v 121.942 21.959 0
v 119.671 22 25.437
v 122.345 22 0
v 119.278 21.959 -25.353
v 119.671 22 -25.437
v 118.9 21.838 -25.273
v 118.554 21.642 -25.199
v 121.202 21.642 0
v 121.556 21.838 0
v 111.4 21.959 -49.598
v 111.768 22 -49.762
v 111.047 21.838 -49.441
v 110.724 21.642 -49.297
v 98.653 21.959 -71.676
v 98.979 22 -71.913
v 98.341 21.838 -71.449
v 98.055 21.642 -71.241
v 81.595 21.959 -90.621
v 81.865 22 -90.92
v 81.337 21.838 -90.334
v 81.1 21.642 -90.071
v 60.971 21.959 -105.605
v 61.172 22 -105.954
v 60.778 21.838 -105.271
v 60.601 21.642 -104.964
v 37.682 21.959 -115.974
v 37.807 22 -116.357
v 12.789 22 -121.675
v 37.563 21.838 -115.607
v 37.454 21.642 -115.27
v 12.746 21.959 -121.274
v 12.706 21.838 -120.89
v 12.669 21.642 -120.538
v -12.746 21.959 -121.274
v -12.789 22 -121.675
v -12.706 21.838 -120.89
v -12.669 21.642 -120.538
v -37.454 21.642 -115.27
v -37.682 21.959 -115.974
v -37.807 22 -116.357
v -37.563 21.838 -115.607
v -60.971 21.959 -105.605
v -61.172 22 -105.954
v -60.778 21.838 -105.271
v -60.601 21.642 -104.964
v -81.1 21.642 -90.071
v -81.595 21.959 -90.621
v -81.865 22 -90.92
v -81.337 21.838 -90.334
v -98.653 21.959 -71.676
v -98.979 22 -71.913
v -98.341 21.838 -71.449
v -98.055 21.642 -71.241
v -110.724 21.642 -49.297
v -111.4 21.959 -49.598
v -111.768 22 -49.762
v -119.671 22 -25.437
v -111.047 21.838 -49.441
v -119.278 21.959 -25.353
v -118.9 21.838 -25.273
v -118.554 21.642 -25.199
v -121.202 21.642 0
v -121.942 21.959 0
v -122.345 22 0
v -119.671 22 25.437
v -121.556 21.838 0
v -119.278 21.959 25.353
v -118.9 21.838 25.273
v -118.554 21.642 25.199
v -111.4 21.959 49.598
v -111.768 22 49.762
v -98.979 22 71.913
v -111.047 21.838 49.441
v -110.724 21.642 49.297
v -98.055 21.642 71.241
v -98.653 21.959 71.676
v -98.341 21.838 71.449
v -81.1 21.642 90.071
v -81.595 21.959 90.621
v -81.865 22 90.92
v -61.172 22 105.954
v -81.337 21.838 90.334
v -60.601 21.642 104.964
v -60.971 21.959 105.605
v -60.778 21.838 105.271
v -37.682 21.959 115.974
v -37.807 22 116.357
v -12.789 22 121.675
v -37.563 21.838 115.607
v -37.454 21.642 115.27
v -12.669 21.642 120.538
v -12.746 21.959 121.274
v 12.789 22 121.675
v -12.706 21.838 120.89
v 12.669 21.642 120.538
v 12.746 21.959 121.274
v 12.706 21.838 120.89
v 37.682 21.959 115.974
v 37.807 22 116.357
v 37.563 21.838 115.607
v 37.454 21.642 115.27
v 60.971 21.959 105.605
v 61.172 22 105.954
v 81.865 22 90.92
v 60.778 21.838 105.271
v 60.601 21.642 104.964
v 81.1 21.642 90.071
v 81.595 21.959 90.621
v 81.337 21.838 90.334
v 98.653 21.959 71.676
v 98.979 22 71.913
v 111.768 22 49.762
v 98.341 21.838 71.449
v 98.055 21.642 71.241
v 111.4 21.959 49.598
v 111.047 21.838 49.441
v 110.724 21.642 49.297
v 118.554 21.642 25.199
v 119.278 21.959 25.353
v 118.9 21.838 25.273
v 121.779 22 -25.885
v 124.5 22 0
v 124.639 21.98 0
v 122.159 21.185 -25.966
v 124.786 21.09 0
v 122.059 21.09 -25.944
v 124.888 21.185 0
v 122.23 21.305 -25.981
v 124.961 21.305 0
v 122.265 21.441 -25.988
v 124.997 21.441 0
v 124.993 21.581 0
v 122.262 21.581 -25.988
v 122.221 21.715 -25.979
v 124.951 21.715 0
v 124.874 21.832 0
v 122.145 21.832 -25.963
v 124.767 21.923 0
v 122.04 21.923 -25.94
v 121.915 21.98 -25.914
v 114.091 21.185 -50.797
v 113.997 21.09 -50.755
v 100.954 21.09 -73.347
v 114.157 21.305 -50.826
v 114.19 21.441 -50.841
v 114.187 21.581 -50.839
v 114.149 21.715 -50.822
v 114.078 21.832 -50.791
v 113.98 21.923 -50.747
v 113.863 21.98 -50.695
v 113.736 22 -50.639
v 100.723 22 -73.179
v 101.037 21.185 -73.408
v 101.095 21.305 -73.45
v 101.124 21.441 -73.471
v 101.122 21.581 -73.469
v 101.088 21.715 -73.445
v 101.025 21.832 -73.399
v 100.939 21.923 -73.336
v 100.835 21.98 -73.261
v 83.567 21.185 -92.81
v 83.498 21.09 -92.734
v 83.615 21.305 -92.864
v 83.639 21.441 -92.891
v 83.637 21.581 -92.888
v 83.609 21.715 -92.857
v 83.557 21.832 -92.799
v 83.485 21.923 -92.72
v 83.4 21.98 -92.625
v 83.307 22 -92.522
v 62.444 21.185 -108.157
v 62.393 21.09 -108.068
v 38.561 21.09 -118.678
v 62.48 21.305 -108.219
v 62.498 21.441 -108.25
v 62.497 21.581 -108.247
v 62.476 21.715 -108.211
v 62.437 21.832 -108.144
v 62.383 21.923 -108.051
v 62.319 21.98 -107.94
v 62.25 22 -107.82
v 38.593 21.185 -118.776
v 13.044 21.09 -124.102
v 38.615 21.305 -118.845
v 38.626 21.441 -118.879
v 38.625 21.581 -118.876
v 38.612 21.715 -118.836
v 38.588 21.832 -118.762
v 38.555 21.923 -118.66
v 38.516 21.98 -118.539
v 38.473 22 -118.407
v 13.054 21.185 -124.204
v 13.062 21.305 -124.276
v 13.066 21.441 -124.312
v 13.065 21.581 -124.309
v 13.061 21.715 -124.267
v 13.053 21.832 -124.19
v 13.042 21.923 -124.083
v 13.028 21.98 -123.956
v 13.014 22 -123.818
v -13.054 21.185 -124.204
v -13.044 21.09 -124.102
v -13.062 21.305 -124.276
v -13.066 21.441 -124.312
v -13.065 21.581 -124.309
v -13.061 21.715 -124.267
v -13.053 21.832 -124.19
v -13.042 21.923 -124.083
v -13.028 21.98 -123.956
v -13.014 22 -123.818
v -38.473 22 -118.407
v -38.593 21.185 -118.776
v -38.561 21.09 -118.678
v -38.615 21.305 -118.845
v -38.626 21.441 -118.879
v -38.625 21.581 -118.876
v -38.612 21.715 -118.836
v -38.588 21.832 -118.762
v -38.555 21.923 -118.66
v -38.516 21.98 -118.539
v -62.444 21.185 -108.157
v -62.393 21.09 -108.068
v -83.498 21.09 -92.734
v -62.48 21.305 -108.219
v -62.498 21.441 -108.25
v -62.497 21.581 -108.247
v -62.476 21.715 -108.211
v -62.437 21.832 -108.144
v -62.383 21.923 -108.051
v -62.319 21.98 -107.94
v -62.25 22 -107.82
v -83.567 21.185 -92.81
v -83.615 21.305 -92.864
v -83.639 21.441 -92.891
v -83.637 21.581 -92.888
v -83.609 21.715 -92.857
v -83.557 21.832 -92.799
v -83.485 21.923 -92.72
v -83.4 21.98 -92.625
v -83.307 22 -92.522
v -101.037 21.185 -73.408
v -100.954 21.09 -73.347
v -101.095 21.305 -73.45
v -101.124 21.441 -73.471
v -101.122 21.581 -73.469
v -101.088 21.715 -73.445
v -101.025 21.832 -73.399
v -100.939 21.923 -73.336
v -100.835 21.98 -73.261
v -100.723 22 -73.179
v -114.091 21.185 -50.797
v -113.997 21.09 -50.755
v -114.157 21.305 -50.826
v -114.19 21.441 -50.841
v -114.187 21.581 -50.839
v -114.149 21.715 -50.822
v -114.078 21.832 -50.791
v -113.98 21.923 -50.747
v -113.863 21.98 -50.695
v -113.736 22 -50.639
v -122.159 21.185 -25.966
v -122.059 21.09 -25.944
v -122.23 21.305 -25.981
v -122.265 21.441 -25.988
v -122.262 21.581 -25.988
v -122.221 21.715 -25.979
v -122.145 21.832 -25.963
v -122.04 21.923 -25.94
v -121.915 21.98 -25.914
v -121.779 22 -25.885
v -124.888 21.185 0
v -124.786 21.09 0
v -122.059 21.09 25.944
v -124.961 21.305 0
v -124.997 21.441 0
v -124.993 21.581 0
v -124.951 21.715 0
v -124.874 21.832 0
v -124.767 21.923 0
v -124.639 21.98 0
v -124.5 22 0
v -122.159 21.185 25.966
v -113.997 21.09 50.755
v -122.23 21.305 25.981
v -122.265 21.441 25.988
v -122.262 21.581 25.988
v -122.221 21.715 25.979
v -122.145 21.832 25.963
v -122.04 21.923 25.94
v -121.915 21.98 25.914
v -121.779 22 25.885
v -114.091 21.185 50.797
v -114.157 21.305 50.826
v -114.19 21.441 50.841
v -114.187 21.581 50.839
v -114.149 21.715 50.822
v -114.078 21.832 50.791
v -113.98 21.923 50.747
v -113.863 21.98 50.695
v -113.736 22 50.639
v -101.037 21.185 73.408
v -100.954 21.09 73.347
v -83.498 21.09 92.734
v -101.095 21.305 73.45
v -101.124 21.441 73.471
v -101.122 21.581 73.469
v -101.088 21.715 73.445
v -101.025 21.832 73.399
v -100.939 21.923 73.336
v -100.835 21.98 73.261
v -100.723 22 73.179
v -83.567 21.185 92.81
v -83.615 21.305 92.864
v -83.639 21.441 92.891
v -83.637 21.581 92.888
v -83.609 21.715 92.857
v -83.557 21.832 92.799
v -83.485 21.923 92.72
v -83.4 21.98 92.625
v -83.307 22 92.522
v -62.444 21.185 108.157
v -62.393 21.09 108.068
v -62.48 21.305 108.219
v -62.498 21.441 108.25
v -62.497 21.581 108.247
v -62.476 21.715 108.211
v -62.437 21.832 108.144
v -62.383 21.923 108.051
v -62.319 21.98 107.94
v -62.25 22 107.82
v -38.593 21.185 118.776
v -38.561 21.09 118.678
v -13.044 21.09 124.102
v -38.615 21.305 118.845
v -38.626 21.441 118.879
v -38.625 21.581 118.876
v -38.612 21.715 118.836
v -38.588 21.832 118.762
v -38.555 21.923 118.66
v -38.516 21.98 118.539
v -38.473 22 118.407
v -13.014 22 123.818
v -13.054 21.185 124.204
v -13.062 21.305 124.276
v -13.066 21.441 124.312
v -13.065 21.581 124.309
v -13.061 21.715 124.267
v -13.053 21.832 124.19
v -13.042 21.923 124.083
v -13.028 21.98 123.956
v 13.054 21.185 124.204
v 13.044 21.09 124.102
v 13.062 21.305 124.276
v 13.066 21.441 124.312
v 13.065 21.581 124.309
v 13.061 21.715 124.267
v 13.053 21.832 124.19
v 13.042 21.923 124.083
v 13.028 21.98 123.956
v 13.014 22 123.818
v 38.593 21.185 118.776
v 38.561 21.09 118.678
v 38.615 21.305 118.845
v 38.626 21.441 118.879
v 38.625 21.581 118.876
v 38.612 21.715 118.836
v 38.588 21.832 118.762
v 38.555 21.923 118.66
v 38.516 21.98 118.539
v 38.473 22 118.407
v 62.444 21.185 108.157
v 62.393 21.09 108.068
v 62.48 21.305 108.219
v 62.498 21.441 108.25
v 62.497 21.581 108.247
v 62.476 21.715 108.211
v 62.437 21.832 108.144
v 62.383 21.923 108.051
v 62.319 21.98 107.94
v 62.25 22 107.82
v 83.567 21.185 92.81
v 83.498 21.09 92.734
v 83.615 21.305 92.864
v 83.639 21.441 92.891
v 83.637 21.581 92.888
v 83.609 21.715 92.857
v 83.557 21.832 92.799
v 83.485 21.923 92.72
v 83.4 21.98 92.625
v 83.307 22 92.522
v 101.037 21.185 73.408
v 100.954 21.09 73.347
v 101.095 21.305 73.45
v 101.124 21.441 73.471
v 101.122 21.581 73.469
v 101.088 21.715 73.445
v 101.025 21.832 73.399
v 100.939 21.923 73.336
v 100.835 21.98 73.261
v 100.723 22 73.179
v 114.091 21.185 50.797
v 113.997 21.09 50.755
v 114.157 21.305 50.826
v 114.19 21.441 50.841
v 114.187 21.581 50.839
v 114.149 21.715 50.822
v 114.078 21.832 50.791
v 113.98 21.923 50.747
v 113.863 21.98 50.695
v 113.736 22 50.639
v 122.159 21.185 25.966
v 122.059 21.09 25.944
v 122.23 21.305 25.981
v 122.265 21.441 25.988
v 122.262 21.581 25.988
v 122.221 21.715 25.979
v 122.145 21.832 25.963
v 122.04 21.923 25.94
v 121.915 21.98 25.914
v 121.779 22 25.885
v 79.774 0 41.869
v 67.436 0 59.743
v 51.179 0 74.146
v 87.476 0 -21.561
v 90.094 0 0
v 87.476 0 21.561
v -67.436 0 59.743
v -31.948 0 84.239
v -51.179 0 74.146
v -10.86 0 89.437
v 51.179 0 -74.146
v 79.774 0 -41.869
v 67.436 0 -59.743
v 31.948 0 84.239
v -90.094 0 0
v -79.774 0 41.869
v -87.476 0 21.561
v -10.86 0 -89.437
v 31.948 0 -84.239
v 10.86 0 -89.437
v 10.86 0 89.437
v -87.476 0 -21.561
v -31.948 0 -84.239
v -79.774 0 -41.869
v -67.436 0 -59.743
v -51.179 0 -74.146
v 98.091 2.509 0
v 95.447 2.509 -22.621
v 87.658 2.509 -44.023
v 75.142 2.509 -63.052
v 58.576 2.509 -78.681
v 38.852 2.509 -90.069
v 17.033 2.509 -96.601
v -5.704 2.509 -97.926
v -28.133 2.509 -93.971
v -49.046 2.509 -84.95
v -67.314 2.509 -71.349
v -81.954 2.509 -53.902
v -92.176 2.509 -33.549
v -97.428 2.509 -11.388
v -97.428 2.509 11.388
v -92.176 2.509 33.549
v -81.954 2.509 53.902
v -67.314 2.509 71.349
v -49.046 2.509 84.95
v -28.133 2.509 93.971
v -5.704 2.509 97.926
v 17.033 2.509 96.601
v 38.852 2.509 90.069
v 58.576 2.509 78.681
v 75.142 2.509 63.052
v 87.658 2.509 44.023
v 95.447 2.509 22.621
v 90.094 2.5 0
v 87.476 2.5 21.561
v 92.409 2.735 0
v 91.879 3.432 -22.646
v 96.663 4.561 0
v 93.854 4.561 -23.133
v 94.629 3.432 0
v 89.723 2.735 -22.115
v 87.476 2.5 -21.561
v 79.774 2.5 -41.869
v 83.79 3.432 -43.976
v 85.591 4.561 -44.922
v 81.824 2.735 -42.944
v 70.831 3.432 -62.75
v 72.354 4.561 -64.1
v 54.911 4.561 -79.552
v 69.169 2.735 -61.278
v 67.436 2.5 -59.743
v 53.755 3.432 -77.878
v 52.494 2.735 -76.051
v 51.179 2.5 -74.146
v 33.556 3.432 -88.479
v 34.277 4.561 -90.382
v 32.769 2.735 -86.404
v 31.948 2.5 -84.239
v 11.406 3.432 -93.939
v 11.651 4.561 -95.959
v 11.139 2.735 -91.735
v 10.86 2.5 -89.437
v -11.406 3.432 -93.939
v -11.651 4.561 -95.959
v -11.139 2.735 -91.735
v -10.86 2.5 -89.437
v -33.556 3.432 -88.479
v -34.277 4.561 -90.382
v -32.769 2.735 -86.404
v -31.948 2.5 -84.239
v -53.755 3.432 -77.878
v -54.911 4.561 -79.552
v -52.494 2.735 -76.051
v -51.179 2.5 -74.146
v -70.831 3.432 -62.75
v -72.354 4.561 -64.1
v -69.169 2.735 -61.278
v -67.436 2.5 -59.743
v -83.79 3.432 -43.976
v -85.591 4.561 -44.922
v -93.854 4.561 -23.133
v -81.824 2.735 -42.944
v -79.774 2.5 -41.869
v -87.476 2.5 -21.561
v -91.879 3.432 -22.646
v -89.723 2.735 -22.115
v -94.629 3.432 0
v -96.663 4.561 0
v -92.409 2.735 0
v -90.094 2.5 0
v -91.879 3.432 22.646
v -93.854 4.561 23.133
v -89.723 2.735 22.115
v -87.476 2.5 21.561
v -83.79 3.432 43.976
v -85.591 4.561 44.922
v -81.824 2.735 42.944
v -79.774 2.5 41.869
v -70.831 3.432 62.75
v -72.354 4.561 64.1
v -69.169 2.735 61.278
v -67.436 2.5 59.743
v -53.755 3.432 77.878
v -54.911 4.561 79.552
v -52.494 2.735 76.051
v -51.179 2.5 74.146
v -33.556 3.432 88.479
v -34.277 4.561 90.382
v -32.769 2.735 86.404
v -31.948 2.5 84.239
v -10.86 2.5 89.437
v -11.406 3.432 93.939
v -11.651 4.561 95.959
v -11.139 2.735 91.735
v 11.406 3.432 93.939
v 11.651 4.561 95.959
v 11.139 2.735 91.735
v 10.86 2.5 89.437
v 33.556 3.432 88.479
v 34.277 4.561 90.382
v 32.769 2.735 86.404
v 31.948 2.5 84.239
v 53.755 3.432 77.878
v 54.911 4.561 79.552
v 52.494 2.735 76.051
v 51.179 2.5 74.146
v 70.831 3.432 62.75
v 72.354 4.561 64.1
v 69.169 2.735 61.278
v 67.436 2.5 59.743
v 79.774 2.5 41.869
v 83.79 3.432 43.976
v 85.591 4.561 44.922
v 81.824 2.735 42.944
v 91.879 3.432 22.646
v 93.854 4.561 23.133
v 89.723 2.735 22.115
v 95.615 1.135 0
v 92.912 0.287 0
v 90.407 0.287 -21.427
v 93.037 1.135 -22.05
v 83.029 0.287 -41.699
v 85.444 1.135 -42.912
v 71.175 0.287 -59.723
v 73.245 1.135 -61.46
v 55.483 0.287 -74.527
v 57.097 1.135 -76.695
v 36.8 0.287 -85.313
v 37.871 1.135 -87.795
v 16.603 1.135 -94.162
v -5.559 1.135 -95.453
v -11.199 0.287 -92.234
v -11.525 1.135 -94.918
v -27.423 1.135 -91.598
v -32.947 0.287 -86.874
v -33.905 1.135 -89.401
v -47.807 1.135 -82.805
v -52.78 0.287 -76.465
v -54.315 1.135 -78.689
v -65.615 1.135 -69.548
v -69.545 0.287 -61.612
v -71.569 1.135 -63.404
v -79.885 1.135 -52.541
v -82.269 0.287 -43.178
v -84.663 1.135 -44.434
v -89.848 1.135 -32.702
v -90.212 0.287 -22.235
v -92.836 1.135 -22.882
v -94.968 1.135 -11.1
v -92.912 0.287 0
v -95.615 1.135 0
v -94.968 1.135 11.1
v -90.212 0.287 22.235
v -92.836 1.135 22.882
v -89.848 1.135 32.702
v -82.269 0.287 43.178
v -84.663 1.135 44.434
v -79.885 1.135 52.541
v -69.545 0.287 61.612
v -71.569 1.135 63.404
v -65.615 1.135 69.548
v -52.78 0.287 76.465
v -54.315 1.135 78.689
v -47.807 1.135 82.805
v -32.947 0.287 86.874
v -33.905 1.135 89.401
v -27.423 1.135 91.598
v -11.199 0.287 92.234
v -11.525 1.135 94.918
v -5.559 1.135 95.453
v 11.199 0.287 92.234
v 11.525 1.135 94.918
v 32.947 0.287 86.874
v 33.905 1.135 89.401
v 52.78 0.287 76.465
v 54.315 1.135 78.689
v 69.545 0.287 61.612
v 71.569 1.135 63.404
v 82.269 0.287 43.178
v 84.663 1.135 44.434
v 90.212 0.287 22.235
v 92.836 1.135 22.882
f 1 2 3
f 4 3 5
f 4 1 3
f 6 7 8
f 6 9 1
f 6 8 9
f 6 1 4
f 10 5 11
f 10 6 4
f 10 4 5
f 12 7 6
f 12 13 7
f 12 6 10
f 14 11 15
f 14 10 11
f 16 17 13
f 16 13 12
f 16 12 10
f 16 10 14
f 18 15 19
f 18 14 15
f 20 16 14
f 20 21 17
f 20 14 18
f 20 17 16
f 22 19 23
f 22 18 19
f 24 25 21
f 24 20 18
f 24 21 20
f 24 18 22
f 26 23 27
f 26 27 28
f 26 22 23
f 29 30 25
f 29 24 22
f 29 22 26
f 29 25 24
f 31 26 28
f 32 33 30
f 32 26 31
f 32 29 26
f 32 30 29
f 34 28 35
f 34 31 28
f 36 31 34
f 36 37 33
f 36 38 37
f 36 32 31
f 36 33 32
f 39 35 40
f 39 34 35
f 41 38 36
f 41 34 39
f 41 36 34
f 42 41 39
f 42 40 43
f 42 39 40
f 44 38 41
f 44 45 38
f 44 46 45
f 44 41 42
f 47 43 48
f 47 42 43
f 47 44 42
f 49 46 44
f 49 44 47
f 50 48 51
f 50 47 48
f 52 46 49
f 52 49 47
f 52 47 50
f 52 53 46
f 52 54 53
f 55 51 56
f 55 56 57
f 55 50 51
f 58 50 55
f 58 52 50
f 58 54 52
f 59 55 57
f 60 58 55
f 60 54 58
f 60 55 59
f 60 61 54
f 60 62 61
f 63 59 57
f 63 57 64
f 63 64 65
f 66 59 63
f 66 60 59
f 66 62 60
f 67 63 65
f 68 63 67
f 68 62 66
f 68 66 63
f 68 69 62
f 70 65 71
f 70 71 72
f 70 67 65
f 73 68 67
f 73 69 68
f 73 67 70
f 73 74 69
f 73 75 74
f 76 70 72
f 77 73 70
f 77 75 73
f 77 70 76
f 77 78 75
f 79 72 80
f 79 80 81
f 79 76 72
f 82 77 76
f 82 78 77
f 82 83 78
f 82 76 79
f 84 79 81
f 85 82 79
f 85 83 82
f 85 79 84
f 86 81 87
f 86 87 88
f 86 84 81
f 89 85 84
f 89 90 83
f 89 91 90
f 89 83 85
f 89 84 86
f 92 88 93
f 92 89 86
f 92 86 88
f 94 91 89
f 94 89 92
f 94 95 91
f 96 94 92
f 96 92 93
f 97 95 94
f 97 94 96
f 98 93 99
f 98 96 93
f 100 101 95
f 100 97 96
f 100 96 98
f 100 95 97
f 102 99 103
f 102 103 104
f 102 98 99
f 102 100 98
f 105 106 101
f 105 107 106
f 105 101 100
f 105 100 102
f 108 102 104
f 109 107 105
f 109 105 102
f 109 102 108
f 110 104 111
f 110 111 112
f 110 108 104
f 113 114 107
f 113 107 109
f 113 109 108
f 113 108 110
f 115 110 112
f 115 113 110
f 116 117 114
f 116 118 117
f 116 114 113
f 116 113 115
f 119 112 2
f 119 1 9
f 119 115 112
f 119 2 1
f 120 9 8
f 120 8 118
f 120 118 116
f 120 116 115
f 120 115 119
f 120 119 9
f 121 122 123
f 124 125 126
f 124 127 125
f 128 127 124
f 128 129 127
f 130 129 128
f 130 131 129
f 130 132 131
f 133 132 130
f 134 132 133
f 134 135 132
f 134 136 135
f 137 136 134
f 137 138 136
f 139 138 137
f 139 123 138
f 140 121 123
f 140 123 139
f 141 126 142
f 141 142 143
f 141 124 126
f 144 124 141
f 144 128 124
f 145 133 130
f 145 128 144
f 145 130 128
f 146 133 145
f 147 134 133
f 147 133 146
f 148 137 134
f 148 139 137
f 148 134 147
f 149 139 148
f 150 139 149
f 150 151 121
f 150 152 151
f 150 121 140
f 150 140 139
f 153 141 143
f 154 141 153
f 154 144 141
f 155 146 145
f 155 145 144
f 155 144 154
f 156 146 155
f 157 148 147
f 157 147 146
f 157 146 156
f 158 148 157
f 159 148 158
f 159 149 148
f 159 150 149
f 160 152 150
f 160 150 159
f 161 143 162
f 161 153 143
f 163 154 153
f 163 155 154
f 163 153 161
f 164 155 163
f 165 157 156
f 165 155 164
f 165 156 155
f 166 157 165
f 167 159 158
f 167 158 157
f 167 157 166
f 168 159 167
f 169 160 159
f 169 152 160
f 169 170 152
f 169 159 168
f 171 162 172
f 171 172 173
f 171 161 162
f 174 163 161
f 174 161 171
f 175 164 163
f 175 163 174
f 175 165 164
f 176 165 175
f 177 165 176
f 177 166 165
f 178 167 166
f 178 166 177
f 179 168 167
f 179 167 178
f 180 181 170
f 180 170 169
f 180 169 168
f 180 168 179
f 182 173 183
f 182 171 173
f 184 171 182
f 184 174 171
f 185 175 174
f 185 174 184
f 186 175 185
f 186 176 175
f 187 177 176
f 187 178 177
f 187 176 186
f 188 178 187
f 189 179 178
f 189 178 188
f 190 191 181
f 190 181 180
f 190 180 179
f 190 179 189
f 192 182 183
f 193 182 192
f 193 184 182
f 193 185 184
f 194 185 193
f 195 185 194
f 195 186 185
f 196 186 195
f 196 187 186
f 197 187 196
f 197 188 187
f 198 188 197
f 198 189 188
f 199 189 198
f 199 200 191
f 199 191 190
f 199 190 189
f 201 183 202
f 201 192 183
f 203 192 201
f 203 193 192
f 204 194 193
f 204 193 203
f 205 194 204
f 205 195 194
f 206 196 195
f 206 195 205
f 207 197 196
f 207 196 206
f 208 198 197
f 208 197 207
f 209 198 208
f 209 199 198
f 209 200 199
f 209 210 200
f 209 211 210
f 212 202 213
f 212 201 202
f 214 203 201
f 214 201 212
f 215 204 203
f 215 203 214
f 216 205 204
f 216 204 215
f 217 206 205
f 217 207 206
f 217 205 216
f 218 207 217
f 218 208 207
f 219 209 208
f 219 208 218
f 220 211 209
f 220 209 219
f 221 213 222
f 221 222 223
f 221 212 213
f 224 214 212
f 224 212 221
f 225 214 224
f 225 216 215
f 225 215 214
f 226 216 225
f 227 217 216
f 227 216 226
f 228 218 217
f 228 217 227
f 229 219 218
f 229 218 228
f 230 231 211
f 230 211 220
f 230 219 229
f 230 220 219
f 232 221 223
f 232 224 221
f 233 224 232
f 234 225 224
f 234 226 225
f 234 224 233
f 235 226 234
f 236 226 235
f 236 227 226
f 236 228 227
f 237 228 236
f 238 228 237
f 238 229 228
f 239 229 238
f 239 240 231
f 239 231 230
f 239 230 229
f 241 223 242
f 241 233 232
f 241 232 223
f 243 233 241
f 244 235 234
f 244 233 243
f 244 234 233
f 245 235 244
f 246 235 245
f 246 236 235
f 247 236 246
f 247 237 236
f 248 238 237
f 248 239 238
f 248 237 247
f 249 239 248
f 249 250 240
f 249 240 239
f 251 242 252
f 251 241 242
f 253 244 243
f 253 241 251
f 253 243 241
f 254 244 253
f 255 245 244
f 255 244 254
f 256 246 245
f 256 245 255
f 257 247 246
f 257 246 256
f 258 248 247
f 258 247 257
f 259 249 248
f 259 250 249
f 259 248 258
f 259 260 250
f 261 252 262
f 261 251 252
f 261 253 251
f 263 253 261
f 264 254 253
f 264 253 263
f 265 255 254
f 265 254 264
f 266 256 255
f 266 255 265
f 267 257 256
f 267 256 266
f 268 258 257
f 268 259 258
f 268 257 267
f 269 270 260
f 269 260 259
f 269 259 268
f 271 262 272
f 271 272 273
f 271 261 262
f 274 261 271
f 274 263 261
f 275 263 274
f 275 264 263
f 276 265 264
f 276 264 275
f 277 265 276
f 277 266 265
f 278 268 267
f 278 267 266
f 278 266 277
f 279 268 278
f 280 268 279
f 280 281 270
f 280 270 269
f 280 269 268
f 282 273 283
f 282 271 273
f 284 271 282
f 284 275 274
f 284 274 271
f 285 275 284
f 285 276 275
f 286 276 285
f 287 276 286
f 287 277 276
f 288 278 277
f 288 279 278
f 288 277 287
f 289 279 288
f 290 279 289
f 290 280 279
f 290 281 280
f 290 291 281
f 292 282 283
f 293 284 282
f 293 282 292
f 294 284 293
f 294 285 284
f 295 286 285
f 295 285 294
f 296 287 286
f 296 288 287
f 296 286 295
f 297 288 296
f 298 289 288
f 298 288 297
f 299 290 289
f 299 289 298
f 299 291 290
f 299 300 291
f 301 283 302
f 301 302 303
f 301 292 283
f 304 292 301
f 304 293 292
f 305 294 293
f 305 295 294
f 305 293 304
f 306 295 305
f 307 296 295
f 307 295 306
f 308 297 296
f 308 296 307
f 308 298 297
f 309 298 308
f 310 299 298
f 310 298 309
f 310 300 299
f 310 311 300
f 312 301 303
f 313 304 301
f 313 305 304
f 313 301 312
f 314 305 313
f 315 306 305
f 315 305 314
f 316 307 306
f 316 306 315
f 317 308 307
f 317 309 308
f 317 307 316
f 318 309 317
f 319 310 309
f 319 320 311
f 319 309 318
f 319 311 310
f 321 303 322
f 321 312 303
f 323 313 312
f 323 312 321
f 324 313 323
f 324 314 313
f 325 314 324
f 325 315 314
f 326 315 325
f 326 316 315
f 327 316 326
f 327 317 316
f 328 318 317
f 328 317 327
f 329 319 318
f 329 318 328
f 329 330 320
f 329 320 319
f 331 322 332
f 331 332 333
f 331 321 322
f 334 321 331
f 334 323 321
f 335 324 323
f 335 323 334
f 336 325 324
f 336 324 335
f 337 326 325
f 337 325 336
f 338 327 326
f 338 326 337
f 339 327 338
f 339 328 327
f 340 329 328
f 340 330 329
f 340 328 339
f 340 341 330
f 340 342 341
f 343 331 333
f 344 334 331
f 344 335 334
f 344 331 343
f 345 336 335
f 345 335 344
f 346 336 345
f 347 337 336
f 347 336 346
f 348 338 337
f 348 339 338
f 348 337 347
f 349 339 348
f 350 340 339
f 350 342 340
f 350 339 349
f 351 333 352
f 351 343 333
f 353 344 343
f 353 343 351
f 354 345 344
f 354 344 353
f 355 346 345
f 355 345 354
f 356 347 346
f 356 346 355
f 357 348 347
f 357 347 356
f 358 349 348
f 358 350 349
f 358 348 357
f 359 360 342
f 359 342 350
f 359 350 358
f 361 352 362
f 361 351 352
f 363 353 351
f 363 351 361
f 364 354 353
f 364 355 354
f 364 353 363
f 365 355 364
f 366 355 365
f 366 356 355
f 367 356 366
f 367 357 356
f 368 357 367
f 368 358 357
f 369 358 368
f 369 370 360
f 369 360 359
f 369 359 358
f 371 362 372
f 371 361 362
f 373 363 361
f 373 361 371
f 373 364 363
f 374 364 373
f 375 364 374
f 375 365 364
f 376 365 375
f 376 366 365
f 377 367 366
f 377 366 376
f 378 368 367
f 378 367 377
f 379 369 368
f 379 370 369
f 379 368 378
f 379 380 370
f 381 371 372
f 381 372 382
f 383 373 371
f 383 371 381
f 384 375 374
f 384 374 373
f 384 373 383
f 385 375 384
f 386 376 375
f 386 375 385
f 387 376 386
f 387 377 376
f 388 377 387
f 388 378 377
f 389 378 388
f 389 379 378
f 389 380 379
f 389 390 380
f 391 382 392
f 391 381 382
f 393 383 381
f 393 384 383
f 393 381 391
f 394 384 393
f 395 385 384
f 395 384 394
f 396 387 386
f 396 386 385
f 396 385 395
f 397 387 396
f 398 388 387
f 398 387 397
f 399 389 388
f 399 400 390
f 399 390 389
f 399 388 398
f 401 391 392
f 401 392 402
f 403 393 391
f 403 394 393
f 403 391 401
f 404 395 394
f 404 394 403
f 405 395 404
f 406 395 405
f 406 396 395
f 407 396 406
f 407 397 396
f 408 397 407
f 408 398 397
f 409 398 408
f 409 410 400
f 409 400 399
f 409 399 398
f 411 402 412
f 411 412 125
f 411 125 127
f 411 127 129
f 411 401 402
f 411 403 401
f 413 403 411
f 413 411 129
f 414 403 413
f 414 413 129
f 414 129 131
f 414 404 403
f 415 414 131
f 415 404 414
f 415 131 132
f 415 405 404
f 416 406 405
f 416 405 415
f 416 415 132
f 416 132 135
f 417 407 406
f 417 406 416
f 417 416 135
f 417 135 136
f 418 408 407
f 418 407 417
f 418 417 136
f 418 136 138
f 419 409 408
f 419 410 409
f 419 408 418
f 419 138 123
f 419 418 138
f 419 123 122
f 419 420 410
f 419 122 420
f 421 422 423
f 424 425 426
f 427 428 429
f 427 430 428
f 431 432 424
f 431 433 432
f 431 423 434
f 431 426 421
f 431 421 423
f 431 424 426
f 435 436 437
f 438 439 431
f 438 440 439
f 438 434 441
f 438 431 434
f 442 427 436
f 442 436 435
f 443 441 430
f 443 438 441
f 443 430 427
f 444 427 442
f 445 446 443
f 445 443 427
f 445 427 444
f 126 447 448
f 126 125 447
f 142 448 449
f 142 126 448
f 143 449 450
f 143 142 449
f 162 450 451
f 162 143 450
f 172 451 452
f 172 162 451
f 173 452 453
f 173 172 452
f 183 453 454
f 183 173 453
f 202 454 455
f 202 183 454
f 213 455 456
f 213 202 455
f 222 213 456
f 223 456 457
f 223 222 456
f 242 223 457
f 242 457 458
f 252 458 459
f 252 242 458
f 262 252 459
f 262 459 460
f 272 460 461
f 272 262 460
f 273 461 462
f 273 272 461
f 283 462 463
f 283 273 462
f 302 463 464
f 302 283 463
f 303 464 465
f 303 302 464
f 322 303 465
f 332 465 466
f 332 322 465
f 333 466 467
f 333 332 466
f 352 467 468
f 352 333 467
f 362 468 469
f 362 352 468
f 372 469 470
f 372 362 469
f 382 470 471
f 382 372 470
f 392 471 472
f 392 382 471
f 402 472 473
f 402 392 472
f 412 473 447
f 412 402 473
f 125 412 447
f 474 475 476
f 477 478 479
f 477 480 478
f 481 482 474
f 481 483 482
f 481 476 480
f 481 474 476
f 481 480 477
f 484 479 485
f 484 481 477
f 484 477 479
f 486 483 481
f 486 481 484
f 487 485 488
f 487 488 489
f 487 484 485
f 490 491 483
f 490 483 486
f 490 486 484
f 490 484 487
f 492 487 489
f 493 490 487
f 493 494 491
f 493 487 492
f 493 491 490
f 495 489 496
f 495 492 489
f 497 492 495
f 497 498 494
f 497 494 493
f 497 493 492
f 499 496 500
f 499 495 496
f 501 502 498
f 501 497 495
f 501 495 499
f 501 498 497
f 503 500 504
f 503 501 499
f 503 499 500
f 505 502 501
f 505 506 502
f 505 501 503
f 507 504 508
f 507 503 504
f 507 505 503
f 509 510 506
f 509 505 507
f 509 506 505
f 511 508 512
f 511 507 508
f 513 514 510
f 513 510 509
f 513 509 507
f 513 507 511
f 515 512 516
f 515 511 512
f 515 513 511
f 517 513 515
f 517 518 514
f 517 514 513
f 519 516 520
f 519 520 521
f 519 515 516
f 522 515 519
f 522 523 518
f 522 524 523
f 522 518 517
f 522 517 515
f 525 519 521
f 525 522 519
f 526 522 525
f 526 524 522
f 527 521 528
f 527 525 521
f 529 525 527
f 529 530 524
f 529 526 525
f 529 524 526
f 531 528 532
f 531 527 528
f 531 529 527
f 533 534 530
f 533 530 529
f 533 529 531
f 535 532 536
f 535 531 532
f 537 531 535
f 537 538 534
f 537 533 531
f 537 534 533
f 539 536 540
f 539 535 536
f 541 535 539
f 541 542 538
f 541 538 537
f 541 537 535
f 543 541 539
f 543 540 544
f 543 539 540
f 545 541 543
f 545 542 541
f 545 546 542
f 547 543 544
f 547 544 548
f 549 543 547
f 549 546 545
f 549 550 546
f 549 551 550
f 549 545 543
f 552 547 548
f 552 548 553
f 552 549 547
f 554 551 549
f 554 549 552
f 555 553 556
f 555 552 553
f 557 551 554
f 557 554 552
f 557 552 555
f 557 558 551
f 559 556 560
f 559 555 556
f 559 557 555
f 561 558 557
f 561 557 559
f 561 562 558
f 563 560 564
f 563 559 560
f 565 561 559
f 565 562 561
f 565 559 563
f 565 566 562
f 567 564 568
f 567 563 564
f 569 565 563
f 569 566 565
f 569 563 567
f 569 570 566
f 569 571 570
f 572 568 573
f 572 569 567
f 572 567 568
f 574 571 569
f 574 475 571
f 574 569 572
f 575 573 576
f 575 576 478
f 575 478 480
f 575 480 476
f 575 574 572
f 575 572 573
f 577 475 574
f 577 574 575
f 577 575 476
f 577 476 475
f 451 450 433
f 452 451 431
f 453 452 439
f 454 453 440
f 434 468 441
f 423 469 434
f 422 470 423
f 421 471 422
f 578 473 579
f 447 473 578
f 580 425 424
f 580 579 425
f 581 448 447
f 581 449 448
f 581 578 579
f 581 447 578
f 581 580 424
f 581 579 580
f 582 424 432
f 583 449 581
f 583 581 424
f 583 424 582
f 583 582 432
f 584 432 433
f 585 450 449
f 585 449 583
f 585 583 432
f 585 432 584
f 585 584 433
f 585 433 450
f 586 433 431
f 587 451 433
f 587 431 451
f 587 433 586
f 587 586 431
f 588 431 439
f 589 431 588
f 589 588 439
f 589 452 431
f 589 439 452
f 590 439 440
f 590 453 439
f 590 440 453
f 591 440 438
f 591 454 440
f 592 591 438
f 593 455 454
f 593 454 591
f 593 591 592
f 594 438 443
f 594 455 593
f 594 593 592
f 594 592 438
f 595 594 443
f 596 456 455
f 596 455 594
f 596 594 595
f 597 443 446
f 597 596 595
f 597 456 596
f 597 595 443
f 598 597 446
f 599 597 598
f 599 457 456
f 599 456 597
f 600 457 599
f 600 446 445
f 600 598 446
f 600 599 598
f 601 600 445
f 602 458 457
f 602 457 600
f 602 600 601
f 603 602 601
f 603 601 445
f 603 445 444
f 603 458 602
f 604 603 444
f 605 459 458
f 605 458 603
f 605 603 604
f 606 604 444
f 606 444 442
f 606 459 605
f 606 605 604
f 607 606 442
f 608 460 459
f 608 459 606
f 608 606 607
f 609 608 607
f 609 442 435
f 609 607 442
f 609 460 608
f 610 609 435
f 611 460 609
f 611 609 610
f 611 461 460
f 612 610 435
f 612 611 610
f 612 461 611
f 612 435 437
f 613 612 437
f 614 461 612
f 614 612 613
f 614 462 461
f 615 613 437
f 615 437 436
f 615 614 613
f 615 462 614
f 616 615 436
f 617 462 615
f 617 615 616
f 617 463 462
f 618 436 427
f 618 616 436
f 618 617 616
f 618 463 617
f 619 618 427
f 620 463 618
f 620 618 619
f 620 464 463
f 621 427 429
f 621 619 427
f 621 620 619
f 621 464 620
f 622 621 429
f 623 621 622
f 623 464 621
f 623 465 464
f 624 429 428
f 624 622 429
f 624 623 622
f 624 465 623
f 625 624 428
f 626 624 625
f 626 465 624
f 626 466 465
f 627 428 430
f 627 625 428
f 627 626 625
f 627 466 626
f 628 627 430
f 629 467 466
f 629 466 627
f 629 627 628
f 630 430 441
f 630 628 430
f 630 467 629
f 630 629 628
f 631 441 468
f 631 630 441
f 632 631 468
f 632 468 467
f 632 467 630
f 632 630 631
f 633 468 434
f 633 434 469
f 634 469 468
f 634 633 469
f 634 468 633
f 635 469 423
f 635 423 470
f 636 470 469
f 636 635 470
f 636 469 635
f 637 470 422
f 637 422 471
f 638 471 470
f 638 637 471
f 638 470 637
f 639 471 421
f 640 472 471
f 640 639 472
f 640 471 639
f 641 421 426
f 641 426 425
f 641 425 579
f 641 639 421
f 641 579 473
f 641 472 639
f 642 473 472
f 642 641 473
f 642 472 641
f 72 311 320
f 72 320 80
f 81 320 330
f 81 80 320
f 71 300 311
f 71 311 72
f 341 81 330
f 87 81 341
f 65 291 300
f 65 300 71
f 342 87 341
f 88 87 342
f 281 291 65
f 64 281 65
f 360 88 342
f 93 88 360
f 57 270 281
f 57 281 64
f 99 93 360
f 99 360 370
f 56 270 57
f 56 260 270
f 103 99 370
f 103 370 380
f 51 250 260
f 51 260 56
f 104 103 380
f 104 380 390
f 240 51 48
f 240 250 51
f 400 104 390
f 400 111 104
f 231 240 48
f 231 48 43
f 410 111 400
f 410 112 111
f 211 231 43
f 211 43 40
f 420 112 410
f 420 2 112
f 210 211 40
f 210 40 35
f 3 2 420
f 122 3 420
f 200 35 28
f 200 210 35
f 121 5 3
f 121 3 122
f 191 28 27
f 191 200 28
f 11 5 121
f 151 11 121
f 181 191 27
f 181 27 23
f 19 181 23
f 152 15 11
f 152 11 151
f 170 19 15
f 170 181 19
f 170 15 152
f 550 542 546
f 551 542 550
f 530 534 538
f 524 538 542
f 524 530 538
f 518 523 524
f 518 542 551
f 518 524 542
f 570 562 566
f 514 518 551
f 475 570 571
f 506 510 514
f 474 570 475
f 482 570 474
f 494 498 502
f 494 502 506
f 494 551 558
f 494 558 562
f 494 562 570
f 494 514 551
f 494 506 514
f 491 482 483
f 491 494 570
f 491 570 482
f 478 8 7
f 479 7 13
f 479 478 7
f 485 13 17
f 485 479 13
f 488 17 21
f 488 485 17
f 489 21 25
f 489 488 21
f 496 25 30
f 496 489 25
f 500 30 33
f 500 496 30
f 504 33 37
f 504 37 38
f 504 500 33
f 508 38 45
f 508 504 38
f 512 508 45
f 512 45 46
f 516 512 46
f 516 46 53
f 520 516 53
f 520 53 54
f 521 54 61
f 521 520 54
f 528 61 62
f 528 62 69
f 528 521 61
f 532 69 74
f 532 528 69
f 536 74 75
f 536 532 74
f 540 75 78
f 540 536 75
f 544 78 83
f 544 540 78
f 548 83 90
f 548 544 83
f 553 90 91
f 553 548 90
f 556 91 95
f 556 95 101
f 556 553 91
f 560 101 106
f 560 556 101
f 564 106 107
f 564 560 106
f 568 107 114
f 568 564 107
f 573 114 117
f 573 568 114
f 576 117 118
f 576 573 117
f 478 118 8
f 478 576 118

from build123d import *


with BuildPart() as part:
    # ProfileS → Profile (revolve)
    with BuildSketch(Plane.XY):
        with BuildLine():
            Line((0, 0), (90.093578278, 0))
            ThreePointArc((90.093578278, 0), (94.284750443, 0.64207816), (98.091485449, 2.509417731))
            Line((98.091485449, 2.509417731), (124.785639542, 21.089622062))
            ThreePointArc((124.785639542, 21.089622062), (124.977068637, 21.64968472), (124.5, 22))
            Line((124.5, 22), (122.344952056, 22))
            ThreePointArc((122.344952056, 22), (121.746213175, 21.908274549), (121.202393889, 21.641511753))
            Line((121.202393889, 21.641511753), (96.66328774, 4.561307422))
            ThreePointArc((96.66328774, 4.561307422), (93.536326842, 3.027421346), (90.093578278, 2.5))
            Line((90.093578278, 2.5), (0, 2.5))
            Line((0, 2.5), (0, 0))
        make_face()
    revolve(axis=Axis((0, 0, 0), (0, 1, 0)))


solid = part.part
